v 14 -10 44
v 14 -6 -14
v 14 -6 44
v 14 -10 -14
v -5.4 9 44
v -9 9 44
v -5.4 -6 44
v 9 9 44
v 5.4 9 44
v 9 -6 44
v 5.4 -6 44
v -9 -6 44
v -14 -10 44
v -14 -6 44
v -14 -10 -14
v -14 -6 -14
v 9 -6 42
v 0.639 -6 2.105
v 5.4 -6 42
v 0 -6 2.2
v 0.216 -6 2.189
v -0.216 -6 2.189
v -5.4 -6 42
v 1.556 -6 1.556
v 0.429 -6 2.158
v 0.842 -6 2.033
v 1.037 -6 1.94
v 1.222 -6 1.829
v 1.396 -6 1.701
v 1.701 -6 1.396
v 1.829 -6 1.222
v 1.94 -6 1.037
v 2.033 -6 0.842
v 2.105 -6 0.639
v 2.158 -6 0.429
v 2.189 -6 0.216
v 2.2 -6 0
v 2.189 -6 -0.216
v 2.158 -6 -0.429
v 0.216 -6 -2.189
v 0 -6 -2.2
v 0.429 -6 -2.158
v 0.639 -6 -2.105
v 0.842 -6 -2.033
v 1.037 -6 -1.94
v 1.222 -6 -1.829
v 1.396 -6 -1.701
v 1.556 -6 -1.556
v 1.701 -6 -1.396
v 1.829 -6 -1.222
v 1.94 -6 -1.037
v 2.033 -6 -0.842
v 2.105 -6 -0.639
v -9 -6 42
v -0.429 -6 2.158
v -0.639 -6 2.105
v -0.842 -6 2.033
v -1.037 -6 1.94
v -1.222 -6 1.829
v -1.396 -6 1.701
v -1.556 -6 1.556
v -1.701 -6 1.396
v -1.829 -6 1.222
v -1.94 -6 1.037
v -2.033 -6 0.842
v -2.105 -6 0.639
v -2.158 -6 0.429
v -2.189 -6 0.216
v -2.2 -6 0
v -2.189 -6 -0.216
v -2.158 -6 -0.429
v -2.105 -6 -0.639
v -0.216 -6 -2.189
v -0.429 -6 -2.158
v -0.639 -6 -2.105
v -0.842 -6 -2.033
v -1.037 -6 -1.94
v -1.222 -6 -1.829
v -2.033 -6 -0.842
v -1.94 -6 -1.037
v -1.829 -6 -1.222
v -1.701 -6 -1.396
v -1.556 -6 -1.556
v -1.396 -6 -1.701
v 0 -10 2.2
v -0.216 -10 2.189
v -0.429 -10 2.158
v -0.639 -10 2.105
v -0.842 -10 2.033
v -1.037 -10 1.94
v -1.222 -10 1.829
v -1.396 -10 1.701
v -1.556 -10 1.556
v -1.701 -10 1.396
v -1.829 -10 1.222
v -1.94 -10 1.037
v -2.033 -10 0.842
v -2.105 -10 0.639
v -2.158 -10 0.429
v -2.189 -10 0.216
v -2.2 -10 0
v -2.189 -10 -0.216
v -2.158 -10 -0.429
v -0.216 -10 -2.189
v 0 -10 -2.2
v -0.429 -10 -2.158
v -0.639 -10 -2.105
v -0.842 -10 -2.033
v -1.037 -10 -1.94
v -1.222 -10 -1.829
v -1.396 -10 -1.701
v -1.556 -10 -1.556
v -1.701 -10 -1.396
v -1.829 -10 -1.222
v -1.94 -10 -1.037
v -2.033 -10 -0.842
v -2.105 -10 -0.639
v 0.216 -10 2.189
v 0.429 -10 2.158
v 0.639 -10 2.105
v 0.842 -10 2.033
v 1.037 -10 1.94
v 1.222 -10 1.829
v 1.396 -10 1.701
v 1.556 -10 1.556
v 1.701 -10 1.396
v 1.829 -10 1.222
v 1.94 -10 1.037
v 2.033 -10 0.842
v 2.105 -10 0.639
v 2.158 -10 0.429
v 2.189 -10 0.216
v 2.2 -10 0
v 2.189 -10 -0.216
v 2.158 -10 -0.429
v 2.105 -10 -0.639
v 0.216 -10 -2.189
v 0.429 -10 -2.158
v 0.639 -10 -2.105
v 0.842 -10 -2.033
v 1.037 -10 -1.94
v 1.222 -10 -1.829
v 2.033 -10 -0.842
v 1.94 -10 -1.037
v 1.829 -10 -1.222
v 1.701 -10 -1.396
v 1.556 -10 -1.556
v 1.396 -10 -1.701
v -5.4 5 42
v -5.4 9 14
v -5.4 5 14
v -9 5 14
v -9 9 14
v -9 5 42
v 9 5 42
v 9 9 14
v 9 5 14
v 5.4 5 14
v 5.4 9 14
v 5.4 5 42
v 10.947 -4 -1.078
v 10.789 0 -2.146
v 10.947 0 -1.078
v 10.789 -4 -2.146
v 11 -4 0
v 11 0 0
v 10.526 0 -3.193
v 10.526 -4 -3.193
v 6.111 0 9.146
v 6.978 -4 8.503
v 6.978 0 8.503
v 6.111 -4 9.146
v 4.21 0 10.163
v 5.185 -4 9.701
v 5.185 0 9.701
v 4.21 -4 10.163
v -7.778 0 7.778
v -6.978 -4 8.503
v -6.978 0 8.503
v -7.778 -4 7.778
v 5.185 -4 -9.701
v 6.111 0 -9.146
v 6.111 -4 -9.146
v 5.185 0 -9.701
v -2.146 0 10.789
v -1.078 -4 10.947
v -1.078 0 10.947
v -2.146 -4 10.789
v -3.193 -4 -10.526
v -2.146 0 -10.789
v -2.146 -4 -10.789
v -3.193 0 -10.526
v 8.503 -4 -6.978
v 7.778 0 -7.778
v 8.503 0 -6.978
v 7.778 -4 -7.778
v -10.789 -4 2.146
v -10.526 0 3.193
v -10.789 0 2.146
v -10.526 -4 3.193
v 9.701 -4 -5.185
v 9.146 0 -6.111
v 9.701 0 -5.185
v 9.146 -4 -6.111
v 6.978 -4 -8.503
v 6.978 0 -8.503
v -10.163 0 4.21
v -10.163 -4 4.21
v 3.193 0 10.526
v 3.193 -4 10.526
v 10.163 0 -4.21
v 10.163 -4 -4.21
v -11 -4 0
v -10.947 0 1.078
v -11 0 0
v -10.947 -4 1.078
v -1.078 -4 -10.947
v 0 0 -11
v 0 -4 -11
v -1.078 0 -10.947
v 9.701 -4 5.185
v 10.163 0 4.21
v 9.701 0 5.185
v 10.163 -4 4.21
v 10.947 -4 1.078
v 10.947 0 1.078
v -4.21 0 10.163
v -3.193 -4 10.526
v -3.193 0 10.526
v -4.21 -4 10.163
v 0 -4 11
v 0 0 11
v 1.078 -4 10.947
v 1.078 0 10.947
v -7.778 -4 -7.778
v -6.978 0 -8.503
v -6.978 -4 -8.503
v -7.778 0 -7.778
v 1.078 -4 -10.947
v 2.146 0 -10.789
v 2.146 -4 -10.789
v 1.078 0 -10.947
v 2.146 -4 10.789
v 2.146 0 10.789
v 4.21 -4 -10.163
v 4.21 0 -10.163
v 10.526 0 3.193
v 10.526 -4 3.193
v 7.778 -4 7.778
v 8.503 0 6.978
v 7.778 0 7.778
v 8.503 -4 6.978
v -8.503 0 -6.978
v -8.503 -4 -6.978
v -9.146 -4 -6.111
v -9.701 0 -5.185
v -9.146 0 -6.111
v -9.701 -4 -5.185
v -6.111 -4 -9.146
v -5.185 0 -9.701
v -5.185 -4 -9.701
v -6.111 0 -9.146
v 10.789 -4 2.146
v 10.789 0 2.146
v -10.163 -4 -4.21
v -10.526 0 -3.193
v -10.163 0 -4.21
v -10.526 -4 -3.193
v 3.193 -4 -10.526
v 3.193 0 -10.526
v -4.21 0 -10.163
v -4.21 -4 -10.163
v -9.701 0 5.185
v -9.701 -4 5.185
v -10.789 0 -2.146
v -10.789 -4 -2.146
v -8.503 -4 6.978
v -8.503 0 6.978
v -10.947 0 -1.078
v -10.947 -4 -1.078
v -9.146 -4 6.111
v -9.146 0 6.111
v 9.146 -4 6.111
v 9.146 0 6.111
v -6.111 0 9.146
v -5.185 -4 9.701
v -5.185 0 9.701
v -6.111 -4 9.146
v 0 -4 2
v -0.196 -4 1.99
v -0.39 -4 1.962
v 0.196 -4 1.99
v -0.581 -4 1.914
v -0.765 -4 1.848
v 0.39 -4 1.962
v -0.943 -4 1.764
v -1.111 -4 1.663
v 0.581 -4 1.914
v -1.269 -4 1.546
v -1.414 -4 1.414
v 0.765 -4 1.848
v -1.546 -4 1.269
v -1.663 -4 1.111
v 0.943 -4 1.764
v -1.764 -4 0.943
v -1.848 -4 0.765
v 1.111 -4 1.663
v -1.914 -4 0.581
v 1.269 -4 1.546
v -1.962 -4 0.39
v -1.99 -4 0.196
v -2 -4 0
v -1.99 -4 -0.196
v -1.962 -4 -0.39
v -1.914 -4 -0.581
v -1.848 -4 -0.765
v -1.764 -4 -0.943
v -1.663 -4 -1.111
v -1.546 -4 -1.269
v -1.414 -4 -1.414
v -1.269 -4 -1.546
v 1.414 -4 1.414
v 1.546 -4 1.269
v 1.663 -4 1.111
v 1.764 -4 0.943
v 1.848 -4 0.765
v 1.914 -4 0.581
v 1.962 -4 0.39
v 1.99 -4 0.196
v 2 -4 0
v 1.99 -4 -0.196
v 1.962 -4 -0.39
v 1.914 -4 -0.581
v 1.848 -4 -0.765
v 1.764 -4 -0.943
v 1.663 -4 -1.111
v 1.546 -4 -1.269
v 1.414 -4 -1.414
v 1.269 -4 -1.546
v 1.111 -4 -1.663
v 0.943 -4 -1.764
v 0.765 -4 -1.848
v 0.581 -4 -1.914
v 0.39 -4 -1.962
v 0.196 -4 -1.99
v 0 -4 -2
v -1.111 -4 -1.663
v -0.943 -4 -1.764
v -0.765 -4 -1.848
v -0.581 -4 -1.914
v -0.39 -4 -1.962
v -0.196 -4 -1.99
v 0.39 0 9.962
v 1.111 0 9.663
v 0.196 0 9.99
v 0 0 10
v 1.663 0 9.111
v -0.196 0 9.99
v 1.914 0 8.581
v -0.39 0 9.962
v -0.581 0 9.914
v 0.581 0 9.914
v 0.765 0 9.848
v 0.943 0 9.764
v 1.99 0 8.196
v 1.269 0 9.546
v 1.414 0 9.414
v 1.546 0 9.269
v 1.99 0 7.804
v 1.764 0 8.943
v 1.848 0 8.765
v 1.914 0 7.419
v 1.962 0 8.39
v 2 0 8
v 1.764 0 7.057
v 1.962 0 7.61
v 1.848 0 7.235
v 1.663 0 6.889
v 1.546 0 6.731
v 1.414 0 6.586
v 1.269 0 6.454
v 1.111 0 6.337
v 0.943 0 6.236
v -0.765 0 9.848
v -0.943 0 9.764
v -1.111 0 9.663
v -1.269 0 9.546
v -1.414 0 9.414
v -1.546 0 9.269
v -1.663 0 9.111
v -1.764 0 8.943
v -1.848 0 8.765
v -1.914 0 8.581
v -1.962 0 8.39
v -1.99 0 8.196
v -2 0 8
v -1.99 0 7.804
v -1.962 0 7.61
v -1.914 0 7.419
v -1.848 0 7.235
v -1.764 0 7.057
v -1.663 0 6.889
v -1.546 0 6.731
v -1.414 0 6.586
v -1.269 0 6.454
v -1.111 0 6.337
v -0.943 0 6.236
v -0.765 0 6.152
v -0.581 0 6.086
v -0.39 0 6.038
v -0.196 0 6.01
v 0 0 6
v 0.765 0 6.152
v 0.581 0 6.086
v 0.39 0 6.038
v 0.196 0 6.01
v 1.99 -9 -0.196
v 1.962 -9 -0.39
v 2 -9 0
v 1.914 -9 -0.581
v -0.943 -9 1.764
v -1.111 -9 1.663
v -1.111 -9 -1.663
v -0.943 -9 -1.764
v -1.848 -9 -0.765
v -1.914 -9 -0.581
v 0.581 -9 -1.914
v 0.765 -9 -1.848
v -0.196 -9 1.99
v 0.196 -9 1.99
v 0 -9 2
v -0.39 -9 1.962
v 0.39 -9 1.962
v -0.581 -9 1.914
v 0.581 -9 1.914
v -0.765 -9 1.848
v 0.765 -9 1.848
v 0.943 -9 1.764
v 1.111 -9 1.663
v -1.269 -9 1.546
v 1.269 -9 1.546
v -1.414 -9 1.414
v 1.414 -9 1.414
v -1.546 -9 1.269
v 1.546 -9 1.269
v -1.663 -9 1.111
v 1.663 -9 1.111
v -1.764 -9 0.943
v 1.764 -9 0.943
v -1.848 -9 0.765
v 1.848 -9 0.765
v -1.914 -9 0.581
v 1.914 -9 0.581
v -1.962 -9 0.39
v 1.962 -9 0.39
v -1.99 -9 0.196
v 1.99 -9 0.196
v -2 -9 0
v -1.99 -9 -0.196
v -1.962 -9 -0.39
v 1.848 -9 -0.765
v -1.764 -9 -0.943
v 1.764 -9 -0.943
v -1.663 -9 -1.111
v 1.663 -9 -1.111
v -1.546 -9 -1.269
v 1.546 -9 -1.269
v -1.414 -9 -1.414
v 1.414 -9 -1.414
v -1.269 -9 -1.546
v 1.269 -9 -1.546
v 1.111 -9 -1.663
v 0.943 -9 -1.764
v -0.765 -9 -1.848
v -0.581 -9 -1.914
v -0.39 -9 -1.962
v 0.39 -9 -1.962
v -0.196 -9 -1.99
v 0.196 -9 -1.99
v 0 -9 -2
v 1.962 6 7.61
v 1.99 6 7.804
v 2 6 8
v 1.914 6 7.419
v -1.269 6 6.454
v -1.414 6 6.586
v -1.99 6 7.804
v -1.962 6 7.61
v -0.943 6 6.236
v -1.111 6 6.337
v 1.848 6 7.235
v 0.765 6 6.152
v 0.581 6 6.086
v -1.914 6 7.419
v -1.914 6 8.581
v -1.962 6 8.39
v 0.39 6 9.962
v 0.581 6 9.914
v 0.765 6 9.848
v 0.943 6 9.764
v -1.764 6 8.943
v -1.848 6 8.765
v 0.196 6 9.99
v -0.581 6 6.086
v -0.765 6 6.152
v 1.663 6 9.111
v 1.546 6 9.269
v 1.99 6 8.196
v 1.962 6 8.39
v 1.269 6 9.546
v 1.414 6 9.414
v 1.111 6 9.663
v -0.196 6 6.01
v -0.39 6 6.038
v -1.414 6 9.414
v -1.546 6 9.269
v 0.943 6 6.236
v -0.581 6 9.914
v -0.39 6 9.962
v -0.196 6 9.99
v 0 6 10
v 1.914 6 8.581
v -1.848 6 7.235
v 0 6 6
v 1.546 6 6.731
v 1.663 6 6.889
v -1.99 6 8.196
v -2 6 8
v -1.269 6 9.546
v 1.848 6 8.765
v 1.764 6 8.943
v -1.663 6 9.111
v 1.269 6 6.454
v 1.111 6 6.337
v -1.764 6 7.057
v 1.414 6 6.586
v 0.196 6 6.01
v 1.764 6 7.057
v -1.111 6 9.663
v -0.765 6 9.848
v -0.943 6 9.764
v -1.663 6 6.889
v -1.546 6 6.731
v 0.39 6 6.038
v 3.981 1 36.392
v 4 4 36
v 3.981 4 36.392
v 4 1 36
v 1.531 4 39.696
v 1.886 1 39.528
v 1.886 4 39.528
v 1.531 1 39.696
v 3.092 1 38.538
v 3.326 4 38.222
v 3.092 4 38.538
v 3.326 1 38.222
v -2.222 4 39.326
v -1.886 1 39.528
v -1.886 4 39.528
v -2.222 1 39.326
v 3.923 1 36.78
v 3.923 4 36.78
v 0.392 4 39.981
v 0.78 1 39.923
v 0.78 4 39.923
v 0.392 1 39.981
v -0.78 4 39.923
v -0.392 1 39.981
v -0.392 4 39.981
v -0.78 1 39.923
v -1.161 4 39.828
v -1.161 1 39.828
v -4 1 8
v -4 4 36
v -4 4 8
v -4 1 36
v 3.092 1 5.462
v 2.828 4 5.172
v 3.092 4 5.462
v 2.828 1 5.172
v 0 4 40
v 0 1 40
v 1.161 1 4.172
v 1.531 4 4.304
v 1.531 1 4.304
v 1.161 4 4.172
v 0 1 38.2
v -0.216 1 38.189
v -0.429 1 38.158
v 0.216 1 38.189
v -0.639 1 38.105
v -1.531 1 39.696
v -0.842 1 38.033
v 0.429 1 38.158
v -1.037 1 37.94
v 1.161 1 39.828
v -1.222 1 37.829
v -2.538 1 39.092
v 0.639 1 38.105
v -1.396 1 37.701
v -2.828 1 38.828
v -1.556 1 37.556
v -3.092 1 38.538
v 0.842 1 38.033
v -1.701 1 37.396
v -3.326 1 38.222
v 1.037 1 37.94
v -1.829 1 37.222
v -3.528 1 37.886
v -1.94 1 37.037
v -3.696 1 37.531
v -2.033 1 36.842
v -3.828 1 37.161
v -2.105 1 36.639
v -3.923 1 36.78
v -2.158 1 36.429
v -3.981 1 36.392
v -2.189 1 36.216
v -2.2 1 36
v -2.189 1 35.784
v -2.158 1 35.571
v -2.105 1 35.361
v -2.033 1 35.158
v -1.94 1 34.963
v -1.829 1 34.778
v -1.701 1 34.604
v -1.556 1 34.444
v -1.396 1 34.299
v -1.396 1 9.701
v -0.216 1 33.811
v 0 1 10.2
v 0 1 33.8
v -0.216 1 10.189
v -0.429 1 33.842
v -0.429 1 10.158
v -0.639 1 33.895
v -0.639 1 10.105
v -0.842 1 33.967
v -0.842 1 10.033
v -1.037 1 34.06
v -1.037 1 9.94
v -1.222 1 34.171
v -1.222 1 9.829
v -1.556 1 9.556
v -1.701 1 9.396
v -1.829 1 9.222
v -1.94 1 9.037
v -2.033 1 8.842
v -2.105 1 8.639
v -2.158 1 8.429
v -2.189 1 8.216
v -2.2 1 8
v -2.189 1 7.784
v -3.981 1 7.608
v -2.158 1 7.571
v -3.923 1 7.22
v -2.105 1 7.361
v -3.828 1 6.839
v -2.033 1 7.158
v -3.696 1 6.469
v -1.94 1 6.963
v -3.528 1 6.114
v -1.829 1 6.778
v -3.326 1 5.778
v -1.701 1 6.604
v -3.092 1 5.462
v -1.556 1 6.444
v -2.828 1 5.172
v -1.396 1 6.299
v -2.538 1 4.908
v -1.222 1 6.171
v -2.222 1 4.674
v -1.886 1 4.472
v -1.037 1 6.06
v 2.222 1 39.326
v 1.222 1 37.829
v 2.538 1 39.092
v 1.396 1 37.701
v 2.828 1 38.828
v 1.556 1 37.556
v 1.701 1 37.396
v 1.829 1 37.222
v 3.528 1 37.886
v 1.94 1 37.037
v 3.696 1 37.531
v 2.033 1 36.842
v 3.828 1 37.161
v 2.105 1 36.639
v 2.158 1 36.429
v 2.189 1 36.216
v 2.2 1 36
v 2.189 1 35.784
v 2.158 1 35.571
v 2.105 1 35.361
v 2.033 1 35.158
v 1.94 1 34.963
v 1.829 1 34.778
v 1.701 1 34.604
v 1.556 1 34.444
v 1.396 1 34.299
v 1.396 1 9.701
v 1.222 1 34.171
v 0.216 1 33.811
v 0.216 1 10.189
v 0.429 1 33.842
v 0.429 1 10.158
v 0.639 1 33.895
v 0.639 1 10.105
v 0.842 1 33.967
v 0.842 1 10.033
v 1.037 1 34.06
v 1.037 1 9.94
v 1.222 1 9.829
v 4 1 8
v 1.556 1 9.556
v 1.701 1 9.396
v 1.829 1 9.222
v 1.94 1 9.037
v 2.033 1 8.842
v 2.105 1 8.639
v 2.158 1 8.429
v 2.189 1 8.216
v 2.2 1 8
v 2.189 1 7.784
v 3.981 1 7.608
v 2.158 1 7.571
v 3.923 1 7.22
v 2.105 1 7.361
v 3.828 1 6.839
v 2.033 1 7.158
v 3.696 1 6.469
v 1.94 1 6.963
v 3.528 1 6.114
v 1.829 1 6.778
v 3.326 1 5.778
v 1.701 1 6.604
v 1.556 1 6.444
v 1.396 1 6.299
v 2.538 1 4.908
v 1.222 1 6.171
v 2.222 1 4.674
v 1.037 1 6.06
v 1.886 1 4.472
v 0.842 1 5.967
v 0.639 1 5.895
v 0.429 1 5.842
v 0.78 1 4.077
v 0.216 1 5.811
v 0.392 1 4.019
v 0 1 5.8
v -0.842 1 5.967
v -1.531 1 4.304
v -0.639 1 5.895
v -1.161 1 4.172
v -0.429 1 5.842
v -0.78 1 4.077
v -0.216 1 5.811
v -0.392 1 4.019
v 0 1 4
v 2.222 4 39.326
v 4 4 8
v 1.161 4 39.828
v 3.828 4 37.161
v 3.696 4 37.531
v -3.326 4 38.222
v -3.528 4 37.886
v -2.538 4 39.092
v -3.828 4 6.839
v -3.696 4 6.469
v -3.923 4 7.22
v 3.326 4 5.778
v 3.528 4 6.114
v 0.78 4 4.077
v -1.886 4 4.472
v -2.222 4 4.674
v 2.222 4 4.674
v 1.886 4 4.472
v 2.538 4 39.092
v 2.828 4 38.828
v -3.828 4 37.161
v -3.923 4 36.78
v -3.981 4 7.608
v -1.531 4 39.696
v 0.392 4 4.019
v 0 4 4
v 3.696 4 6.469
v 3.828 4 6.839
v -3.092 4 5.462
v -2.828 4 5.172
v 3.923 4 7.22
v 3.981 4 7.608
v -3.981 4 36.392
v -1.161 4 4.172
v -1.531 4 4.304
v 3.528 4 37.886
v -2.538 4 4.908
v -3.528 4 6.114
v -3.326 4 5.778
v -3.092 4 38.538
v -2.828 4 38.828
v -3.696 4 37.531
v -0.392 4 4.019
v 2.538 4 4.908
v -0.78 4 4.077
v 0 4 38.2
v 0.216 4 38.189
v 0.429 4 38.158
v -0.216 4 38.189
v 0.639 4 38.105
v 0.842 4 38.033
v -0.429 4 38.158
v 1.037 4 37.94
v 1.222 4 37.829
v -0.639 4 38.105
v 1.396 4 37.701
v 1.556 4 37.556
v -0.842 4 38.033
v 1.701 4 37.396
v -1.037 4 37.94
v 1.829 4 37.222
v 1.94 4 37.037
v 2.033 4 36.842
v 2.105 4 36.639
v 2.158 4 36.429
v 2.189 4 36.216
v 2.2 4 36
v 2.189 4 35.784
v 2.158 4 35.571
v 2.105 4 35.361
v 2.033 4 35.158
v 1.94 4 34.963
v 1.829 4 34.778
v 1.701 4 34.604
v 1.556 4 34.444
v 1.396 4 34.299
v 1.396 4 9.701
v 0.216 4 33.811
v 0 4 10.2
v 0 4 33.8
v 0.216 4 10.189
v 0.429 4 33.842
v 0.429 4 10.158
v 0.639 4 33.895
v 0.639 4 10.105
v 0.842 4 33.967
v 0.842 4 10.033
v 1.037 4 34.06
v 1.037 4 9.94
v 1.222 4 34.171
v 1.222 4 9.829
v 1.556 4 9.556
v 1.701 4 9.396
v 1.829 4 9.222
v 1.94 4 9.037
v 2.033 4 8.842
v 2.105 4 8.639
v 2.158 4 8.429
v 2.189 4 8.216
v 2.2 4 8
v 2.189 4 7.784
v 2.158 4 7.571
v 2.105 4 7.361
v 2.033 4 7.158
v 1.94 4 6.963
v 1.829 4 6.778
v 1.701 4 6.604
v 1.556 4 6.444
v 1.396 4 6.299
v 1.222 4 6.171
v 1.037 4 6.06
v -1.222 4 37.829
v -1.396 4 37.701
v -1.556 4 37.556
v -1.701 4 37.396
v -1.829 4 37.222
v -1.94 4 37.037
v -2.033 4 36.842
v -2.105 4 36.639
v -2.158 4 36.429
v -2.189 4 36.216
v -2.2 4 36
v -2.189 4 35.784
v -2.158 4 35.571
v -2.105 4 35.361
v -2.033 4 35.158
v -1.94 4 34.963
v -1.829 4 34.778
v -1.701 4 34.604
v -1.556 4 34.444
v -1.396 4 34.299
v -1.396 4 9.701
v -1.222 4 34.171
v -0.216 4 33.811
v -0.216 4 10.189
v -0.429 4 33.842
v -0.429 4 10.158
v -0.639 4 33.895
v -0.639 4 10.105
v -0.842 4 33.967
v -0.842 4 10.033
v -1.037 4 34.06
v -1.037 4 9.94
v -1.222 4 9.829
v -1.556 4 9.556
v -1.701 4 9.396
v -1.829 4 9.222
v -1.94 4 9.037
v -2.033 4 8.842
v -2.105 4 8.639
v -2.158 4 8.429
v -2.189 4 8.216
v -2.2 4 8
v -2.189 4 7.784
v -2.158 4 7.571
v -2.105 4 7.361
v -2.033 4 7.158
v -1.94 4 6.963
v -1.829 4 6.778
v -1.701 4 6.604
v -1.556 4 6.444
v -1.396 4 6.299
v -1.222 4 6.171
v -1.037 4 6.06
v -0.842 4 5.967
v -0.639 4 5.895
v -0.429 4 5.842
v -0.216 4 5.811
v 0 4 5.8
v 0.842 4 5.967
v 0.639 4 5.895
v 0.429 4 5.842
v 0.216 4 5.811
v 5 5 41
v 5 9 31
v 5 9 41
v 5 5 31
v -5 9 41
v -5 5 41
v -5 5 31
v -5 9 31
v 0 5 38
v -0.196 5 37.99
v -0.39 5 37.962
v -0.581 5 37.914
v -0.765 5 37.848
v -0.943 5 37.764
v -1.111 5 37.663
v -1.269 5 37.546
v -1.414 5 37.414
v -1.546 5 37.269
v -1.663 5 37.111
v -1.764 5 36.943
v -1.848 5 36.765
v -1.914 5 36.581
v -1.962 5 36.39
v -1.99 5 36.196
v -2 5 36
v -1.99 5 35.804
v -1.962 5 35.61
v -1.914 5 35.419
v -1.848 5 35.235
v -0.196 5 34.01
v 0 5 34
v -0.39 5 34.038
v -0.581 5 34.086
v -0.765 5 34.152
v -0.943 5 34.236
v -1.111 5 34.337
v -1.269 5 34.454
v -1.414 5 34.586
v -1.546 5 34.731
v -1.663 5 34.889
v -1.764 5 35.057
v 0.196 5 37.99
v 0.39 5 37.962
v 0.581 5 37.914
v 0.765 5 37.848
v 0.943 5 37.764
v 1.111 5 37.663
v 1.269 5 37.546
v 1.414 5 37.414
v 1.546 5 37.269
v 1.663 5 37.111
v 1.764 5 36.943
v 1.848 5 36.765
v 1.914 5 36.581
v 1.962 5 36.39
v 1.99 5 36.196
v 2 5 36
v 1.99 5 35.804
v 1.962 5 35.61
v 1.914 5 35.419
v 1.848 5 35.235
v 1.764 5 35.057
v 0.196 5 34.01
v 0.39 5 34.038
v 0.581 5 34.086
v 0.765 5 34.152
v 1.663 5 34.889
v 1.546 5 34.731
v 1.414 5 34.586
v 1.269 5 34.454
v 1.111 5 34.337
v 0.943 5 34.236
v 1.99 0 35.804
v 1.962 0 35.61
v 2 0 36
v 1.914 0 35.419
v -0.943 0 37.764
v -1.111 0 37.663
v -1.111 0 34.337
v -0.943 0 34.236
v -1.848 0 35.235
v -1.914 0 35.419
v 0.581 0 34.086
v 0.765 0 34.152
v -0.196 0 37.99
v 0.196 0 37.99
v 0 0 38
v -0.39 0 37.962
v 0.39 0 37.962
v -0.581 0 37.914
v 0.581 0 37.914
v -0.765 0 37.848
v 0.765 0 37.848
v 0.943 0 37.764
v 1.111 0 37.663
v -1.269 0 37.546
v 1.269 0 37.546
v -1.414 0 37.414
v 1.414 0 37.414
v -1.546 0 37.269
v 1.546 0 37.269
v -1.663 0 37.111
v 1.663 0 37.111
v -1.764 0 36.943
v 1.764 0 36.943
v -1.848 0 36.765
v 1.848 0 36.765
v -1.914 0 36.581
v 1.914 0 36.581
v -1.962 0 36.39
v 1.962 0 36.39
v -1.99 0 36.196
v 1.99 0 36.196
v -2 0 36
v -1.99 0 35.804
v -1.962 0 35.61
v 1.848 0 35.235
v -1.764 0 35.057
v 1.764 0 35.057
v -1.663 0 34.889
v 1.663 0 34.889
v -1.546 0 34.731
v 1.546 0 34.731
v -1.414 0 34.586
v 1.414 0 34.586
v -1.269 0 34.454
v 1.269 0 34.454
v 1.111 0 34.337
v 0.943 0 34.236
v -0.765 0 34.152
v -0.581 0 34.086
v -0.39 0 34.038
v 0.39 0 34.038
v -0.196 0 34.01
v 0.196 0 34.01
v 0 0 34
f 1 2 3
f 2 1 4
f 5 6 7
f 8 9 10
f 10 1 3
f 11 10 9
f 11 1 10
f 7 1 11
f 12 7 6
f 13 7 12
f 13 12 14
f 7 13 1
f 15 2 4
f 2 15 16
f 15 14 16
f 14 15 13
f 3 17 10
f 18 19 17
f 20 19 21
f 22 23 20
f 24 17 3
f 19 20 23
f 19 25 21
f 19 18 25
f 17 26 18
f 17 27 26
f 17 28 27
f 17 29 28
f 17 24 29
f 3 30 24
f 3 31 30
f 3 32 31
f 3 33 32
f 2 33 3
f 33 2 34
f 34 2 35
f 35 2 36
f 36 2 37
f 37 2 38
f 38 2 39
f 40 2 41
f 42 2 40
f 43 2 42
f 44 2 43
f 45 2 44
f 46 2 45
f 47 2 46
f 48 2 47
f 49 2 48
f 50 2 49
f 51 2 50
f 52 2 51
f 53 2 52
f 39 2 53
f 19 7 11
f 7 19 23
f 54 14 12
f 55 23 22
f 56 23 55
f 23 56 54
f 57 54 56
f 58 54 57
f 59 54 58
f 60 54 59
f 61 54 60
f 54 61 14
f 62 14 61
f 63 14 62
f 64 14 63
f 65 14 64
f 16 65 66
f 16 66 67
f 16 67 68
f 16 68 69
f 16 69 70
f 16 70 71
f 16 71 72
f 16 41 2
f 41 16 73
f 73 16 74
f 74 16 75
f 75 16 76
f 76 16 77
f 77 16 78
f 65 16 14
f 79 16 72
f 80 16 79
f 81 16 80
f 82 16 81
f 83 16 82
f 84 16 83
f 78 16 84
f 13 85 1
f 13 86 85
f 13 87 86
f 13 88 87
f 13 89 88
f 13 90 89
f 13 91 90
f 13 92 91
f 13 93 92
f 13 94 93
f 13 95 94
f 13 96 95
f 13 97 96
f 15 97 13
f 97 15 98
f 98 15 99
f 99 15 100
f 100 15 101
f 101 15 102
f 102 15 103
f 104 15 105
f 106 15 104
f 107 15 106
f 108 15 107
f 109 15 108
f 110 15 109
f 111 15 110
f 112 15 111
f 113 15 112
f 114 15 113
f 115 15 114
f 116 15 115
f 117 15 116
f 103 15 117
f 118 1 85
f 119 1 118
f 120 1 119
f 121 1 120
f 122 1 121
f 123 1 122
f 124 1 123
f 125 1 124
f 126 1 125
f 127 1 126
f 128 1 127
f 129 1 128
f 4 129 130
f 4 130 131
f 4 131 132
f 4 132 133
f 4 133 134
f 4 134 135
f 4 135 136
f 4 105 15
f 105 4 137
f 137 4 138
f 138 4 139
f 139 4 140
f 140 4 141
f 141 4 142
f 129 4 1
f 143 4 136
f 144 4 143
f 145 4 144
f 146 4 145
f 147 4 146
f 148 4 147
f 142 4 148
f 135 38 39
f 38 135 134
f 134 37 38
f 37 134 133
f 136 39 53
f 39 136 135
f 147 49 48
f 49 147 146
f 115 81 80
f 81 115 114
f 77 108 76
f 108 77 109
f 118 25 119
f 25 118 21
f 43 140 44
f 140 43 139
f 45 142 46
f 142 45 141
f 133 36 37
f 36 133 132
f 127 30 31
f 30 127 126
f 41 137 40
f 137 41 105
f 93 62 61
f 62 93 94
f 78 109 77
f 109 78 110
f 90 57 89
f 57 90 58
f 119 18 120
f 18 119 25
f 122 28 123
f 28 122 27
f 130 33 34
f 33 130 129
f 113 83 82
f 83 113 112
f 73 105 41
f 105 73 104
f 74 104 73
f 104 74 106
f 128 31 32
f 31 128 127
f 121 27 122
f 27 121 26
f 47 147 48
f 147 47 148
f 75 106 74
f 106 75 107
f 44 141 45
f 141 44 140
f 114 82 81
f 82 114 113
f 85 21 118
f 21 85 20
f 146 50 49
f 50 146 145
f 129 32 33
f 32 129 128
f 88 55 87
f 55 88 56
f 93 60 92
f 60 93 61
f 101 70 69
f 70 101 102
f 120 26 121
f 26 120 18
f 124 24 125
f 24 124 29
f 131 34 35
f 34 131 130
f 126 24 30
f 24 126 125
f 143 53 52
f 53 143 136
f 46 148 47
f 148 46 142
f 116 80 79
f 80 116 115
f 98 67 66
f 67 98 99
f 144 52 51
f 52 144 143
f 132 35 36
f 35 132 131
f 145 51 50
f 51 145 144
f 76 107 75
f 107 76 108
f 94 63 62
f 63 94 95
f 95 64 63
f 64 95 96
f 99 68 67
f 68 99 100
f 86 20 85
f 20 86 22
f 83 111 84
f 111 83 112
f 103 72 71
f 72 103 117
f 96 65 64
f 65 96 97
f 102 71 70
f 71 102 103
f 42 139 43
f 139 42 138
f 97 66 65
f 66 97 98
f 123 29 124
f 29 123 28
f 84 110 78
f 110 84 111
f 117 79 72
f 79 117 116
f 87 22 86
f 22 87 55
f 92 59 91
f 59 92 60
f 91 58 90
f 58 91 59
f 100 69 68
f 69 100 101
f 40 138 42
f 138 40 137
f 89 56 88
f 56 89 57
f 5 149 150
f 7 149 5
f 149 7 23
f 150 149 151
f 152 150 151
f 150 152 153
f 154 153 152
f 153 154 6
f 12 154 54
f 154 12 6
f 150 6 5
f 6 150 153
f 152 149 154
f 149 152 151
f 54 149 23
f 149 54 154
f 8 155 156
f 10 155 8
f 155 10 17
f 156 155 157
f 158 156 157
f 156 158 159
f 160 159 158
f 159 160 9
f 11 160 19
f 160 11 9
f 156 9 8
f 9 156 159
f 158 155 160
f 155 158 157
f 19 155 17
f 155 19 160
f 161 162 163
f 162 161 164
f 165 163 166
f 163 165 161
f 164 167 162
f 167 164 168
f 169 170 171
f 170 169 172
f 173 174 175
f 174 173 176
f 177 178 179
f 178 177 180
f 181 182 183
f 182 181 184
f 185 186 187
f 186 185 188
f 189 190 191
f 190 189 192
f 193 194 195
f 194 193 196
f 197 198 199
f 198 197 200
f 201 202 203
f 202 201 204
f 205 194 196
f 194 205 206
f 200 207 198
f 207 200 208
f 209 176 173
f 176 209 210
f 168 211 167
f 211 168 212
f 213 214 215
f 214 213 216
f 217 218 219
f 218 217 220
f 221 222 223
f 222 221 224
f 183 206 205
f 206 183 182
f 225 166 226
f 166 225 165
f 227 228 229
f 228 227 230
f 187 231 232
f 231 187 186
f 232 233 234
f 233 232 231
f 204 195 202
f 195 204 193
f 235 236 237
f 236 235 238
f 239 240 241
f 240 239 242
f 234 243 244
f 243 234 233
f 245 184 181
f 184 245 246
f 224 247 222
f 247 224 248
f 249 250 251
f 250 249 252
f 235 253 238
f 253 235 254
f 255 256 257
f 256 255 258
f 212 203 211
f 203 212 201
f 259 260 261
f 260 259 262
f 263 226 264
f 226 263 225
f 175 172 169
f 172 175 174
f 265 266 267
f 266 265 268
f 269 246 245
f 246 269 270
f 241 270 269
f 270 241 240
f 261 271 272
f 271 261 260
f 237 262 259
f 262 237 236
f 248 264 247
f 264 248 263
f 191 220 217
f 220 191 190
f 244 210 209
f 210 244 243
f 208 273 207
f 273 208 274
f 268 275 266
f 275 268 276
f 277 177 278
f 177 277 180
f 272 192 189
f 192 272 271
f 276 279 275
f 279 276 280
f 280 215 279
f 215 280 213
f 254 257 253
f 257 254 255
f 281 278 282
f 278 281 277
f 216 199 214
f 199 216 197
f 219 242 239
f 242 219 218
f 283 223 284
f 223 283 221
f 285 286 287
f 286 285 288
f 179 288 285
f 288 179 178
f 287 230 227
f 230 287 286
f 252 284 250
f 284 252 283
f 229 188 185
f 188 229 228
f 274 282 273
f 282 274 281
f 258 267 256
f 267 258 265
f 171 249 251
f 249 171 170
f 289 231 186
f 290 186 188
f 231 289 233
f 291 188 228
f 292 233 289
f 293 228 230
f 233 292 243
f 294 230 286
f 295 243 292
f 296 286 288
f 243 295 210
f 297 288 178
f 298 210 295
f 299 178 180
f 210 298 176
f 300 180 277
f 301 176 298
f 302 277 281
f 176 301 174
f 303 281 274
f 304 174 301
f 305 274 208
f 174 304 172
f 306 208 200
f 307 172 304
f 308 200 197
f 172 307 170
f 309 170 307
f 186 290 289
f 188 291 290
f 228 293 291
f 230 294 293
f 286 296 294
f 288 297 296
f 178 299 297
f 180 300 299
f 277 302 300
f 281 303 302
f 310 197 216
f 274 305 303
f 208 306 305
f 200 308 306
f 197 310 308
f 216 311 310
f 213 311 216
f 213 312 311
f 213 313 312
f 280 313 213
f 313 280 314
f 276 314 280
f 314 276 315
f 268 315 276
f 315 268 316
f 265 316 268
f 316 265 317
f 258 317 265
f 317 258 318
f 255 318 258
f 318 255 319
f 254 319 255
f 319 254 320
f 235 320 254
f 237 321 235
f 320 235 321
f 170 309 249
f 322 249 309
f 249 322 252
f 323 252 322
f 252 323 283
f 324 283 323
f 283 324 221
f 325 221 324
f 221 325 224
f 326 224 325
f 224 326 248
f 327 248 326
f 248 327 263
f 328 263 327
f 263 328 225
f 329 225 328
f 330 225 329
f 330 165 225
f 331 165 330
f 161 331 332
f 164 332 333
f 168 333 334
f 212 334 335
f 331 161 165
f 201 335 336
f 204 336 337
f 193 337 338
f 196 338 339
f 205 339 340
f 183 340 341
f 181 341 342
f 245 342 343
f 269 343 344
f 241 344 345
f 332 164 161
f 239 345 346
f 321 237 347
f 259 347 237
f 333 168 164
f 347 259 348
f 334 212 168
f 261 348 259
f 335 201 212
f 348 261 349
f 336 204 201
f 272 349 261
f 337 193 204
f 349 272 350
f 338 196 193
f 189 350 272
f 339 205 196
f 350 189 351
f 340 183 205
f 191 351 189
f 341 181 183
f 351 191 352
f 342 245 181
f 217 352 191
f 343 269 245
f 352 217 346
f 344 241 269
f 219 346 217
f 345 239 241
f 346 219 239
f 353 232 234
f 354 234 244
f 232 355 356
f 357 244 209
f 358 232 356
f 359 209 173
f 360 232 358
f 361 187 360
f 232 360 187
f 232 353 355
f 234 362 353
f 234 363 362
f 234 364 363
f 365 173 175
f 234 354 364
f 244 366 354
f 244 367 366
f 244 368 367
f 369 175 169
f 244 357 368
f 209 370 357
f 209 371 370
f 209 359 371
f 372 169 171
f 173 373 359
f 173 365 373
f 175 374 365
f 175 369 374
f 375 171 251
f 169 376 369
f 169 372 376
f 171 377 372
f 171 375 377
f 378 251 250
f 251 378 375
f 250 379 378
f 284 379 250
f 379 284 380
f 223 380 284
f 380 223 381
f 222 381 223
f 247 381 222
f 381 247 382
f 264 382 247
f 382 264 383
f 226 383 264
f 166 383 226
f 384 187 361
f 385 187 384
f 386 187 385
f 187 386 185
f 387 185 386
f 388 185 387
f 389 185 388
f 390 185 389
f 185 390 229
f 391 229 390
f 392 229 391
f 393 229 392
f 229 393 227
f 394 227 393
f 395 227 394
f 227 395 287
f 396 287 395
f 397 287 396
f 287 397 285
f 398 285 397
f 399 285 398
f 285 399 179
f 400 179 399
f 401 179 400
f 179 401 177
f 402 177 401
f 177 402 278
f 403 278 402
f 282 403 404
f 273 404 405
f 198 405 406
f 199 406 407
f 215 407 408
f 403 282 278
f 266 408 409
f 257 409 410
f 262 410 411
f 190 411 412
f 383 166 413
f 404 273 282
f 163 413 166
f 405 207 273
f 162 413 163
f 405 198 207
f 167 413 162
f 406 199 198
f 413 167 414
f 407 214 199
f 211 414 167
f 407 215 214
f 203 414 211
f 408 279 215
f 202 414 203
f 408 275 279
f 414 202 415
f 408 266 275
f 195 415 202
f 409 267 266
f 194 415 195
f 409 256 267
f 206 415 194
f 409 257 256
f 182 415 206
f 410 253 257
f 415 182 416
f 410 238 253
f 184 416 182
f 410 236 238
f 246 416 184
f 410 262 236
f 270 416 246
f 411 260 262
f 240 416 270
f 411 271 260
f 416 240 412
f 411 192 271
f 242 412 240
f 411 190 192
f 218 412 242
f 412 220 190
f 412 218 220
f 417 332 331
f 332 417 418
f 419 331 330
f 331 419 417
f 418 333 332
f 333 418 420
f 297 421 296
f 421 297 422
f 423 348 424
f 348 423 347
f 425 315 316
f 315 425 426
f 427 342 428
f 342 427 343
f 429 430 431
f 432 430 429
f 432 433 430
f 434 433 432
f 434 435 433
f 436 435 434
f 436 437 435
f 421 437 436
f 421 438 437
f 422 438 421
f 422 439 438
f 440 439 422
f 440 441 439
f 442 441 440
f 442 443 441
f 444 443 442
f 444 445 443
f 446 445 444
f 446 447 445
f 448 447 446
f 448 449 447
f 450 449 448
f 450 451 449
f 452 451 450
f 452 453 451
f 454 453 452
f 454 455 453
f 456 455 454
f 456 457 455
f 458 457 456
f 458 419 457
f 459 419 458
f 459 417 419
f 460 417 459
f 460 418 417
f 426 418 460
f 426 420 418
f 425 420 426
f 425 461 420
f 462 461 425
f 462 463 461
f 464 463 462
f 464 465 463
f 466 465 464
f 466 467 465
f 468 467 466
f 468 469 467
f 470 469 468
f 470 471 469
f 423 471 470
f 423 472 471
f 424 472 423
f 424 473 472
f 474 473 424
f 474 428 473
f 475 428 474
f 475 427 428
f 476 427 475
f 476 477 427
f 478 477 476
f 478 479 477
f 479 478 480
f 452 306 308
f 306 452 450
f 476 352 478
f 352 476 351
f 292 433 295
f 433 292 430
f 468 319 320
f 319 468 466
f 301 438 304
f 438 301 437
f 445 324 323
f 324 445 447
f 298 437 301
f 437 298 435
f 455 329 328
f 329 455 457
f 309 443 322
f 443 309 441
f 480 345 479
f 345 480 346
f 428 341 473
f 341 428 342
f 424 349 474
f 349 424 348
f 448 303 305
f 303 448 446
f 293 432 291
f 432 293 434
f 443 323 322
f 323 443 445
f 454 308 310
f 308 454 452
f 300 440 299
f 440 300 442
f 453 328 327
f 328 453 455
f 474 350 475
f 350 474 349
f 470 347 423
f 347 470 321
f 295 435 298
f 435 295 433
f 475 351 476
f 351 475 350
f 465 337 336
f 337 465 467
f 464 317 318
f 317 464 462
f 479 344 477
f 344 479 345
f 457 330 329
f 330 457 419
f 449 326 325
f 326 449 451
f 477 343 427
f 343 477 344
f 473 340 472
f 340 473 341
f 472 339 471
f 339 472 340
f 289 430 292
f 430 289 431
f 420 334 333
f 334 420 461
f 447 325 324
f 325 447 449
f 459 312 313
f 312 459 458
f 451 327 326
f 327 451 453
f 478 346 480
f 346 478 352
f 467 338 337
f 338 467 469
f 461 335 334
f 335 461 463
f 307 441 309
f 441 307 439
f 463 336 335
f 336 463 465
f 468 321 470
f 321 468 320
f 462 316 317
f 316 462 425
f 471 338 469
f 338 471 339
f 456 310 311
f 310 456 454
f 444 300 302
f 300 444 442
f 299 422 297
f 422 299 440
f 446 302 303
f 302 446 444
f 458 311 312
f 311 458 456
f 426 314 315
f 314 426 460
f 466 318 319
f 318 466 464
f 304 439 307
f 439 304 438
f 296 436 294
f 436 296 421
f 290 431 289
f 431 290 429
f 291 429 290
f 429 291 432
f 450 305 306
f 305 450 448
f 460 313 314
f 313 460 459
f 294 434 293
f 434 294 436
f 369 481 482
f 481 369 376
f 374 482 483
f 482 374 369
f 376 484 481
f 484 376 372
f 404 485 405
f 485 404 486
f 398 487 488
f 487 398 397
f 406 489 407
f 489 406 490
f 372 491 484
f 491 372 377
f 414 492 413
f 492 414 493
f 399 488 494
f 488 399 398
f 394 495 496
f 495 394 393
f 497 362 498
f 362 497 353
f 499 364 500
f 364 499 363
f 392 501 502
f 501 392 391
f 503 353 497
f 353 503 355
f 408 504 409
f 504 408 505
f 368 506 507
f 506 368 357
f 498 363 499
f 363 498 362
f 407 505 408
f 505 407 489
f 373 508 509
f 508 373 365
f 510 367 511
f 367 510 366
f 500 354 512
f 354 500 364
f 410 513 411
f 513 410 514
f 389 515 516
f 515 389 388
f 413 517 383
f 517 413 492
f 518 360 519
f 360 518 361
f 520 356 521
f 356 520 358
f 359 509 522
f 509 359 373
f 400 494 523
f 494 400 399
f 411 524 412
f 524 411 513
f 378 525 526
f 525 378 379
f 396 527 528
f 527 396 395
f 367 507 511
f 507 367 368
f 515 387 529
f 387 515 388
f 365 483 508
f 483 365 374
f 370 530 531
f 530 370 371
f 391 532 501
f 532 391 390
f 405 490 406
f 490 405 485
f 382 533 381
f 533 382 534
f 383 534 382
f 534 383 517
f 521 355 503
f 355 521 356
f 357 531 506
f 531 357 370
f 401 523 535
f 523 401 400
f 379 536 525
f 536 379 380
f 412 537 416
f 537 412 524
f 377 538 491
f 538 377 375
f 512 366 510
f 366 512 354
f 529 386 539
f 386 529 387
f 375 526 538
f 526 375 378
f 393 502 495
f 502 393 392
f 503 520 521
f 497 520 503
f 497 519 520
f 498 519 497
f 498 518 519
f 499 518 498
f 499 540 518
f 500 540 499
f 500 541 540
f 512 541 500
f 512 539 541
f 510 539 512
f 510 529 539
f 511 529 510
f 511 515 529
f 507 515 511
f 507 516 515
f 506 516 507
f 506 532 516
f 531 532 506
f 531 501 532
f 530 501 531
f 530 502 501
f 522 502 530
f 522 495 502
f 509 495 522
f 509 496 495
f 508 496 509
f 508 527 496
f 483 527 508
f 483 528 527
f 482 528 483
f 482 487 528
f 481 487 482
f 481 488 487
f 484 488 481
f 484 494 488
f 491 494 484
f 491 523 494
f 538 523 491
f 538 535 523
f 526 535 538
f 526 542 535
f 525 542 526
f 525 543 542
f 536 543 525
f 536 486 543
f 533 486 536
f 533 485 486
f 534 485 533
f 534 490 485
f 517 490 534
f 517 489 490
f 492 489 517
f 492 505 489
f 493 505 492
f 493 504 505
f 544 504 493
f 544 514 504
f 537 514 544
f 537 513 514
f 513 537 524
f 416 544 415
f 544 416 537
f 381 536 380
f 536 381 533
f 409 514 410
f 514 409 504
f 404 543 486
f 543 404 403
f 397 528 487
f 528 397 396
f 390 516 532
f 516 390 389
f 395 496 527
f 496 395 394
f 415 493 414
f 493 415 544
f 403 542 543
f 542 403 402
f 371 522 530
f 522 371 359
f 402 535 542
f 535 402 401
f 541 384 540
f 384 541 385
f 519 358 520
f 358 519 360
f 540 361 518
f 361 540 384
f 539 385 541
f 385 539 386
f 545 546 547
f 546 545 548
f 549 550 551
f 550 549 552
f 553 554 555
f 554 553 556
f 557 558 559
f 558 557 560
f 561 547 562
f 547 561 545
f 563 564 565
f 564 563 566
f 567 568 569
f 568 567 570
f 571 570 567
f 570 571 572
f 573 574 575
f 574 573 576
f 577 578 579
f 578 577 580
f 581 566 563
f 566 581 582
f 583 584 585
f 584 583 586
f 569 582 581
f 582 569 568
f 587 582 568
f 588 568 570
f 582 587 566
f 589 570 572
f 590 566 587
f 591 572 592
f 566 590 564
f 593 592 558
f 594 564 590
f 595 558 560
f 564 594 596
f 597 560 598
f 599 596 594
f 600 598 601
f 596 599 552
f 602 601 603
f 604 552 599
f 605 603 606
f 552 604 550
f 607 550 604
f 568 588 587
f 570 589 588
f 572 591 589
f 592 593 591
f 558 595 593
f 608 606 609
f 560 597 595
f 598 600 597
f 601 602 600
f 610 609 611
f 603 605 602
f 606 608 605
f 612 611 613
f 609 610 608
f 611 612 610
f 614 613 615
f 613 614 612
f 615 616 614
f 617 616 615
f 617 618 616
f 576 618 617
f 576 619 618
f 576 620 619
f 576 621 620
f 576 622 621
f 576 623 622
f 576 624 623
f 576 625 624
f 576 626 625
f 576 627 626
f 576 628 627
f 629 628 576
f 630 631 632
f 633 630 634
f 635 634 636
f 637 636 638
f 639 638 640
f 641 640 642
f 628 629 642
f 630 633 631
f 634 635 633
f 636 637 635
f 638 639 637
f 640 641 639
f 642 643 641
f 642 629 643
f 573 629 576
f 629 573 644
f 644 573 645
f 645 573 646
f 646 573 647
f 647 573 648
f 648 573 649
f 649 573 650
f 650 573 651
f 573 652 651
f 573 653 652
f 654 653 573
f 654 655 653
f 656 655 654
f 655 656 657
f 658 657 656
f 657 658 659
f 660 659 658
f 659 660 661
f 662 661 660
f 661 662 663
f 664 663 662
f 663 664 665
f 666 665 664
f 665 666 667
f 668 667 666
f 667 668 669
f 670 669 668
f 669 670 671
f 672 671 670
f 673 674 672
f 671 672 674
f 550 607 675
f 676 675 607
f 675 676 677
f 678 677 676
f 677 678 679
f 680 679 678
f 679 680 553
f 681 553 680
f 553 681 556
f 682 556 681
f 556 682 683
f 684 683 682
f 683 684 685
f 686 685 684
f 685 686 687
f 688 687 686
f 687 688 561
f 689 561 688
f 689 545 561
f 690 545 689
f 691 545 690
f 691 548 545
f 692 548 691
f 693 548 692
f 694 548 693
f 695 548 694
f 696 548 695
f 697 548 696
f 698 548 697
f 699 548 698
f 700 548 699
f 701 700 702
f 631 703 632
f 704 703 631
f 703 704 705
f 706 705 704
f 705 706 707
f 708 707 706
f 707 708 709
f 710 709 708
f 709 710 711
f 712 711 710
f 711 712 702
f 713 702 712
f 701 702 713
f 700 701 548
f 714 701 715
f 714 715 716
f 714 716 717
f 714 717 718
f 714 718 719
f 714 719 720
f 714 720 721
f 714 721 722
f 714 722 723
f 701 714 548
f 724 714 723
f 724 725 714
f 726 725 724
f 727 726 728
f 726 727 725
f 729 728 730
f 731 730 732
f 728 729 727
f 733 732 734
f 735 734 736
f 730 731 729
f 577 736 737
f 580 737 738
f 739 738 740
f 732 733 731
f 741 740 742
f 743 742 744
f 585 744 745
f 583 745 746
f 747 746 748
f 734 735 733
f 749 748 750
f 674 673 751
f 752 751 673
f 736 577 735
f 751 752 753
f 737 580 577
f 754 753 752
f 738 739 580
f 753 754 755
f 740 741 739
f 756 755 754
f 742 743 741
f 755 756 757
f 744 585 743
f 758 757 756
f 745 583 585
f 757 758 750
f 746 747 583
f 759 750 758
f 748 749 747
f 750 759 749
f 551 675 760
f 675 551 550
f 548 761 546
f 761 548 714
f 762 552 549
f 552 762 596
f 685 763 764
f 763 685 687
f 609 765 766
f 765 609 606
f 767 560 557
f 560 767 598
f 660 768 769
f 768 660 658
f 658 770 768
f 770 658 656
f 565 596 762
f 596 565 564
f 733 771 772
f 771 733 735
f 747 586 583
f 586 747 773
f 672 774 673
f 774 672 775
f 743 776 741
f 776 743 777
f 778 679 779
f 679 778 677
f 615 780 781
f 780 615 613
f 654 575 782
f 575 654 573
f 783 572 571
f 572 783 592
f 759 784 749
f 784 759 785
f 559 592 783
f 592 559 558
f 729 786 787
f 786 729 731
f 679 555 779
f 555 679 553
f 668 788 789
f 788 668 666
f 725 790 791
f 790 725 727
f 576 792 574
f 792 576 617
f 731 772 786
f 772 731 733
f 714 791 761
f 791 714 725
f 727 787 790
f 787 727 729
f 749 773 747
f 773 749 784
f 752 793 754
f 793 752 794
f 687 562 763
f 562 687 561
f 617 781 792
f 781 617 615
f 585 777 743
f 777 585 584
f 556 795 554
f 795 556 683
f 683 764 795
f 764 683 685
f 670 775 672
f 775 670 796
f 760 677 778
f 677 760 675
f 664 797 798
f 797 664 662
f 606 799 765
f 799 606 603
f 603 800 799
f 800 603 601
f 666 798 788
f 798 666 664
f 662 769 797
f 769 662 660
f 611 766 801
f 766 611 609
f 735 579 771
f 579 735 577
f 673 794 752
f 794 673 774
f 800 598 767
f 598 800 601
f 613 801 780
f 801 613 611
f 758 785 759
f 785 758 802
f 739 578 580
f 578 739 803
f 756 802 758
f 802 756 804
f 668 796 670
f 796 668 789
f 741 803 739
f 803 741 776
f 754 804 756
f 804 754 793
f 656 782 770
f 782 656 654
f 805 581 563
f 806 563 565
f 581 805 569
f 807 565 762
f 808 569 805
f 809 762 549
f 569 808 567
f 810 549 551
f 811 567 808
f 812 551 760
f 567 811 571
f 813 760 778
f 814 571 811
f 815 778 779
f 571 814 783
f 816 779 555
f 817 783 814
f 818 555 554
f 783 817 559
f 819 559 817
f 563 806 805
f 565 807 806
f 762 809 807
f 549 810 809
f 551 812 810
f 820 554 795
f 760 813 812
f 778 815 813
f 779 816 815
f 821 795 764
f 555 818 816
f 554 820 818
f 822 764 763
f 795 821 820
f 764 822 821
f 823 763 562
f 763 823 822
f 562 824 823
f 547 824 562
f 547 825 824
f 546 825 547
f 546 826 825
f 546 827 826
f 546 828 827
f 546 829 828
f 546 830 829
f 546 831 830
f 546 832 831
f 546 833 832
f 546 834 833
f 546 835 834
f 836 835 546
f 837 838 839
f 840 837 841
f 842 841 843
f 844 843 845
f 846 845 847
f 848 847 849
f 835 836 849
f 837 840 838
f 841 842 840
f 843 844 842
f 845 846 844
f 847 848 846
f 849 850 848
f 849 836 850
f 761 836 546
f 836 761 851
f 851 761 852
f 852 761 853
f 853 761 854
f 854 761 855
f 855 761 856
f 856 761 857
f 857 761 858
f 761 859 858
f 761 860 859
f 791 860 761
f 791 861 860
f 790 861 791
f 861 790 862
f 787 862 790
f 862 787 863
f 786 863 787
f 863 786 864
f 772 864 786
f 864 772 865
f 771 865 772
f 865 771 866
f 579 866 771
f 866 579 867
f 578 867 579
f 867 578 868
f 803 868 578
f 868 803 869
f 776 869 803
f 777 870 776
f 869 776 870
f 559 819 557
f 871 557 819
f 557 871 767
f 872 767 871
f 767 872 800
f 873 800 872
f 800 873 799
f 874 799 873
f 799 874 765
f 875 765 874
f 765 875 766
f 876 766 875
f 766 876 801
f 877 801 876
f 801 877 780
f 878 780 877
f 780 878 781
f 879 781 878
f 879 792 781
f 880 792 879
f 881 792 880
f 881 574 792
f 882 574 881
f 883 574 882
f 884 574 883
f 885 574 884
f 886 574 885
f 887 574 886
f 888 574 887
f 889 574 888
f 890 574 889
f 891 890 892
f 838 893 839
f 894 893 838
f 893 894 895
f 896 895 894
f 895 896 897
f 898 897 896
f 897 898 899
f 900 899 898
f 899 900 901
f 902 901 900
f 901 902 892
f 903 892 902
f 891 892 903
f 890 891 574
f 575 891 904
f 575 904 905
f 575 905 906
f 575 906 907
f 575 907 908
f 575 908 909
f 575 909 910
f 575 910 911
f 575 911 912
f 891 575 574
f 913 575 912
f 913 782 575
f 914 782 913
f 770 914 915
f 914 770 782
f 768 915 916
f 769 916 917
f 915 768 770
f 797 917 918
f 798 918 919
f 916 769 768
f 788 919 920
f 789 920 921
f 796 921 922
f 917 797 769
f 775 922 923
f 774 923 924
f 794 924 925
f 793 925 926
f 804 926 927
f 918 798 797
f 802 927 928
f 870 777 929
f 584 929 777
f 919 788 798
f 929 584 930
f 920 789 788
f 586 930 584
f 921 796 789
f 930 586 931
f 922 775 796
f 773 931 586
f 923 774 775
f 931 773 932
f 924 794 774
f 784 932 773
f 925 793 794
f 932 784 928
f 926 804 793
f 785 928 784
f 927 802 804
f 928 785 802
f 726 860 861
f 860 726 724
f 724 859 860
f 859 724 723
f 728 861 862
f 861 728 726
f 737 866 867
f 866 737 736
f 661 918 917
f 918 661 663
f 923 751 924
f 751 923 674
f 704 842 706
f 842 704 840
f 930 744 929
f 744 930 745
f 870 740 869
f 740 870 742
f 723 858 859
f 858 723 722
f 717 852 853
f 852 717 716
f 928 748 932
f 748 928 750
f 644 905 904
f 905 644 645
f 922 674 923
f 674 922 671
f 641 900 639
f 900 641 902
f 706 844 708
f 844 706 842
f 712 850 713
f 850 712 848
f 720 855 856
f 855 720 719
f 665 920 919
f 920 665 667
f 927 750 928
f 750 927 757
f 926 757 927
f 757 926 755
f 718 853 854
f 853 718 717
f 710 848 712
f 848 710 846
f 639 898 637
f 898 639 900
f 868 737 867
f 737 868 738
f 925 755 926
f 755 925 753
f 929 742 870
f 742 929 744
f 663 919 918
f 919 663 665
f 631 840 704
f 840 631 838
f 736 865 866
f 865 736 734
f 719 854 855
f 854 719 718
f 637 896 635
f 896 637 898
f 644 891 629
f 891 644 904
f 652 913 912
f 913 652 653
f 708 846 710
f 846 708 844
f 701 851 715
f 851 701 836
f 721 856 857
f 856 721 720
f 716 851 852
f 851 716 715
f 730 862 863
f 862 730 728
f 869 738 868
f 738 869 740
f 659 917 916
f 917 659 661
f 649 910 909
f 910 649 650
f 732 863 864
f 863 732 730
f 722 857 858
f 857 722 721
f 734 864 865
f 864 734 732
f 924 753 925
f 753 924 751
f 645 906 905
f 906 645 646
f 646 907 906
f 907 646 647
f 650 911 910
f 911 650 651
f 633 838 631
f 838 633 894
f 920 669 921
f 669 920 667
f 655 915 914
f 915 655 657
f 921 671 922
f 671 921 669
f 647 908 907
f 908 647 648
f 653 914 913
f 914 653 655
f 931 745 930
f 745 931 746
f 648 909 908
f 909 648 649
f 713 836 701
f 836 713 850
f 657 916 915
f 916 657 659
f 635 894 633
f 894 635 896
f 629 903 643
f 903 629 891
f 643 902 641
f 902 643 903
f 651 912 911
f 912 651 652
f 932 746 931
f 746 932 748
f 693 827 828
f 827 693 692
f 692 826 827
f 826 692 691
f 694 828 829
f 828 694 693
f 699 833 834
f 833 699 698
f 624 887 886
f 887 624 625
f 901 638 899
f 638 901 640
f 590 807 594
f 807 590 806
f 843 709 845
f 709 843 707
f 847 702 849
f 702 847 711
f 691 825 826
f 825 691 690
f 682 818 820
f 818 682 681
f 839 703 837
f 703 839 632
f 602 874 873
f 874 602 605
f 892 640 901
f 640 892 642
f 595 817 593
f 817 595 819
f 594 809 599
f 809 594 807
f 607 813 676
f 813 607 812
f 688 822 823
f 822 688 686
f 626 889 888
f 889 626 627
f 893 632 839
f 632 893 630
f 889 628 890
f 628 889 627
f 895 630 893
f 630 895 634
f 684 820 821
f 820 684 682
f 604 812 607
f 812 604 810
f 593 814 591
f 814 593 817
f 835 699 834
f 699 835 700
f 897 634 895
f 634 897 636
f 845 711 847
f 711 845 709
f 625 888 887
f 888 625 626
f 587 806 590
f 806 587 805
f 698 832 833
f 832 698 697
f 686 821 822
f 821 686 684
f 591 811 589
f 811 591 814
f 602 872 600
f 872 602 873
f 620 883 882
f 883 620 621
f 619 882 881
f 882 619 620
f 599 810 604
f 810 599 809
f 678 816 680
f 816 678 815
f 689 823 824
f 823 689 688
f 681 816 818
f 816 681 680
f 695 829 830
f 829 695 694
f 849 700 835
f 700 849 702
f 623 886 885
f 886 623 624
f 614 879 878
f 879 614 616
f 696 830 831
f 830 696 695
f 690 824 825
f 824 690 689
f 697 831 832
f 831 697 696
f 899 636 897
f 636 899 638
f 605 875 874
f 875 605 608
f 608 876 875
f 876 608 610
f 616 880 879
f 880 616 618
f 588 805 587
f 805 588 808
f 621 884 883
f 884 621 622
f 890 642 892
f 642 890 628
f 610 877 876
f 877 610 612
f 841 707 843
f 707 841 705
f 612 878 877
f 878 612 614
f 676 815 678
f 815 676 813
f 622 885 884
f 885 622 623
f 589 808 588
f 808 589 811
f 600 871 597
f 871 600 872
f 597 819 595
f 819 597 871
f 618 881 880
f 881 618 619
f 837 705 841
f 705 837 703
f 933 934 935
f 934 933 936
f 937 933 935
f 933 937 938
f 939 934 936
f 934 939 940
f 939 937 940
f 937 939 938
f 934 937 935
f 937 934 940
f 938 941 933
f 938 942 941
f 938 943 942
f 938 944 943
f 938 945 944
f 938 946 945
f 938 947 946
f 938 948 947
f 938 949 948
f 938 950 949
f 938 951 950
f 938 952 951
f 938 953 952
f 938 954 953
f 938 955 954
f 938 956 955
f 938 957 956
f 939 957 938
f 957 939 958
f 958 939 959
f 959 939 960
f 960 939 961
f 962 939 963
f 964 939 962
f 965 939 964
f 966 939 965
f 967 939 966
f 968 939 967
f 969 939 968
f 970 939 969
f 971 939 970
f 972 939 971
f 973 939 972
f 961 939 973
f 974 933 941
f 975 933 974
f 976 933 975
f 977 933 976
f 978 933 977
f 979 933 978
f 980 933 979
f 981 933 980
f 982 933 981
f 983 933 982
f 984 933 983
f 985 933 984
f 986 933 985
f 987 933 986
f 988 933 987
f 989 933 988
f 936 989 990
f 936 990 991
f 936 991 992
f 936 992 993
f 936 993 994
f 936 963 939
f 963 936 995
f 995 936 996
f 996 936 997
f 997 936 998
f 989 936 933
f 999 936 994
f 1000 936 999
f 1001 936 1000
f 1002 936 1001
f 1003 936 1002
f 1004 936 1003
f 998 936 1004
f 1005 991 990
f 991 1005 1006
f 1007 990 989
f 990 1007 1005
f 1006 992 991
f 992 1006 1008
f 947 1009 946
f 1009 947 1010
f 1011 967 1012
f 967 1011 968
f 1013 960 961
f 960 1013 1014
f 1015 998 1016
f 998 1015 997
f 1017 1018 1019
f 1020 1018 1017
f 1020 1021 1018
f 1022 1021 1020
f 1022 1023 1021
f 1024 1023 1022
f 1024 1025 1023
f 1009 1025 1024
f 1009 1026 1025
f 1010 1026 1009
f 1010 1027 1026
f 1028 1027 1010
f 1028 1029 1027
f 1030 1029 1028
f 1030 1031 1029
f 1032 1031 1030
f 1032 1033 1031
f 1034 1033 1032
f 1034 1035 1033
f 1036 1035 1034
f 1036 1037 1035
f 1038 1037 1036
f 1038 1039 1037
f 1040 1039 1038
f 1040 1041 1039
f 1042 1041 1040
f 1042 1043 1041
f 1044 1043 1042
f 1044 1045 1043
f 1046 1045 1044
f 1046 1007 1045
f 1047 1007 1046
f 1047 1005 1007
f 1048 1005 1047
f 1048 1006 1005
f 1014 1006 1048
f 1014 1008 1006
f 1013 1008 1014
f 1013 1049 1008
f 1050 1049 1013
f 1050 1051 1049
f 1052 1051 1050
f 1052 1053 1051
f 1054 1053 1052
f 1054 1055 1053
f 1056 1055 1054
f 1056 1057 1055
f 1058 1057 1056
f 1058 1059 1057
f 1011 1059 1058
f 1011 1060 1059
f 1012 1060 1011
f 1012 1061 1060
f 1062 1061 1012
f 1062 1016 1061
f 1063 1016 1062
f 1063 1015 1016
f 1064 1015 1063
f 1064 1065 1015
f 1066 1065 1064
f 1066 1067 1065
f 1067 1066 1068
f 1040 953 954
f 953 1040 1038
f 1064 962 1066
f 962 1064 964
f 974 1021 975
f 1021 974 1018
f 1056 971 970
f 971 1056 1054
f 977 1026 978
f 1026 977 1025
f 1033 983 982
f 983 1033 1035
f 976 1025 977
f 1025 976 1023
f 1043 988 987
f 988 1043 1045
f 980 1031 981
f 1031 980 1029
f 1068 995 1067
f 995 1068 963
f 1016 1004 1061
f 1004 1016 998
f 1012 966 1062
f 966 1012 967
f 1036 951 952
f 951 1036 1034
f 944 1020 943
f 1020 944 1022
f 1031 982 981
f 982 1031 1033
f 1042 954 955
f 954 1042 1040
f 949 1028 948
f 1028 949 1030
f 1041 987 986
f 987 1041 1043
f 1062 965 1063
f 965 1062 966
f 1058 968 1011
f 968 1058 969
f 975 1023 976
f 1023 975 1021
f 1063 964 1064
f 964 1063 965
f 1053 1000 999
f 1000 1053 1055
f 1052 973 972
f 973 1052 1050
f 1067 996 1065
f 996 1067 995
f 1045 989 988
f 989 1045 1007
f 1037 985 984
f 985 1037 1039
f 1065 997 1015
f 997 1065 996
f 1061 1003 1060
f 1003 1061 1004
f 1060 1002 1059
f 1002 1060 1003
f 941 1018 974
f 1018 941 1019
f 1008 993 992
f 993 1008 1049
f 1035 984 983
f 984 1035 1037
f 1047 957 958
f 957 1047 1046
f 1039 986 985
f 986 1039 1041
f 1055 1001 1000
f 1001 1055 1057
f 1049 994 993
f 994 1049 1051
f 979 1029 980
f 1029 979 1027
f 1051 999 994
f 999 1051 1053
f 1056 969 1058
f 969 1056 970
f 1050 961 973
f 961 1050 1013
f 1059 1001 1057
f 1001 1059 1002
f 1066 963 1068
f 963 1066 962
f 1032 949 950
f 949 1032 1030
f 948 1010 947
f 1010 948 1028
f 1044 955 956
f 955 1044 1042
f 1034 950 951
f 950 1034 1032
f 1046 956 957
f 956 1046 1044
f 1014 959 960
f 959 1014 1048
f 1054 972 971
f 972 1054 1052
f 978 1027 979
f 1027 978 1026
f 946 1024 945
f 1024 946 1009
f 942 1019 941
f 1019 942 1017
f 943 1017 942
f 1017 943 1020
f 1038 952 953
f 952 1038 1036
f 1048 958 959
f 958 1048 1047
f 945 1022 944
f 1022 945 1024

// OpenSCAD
// Original low-speed slider-crank verification fixture, millimetres.
// Four manufacturing parts. Pins are integral; external axial retention is
// required. No load capacity, print tolerance or physical function is claimed.
agentscad_part = "all";
agentscad_pose = false;
motion_angle = 0;
crank_radius = 8;
rod_length = 28;
$fn = 64;

// All pin axes are parallel to +Y; the mechanism moves in the XZ plane.
module y_cylinder(radius, height) { rotate([-90, 0, 0]) cylinder(r=radius, h=height); }
module crank_local() {
  union() {
    translate([0, -4, 0]) y_cylinder(crank_radius + 3, 4);
    translate([0, -9, 0]) y_cylinder(2, 5.1);
    translate([0, -0.1, crank_radius]) y_cylinder(2, 6.1);
  }
}
module rod_local() {
  difference() {
    hull() {
      translate([0, 1, 0]) y_cylinder(4, 3);
      translate([0, 1, rod_length]) y_cylinder(4, 3);
    }
    translate([0, 0.9, 0]) y_cylinder(2.2, 3.2);
    translate([0, 0.9, rod_length]) y_cylinder(2.2, 3.2);
  }
}
module slider_local() {
  union() {
    translate([-5, 5, -5]) cube([10, 4, 10]);
    y_cylinder(2, 5.1);
  }
}
module frame_local() {
  union() {
    difference() {
      translate([-14, -10, -14]) cube([28, 4, 58]);
      translate([0, -10.1, 0]) y_cylinder(2.2, 4.2);
    }
    for (x = [-9, 5.4]) {
      translate([x, 5, 14]) cube([3.6, 4, 30]);
      translate([x, -6.1, 42]) cube([3.6, 11.2, 2]);
    }
  }
}

// Source-side construction. The checker measures the resulting mesh contours;
// it never consumes these functions or their computed coordinates as evidence.
cx = crank_radius * sin(motion_angle);
cz = crank_radius * cos(motion_angle);
travel = sqrt(rod_length * rod_length - cx * cx);
pz = cz + travel;
rod_angle = atan2(-cx, travel);
module selected_part(id, placed) {
  if (id == "frame") frame_local();
  if (id == "crank") rotate([0, placed ? motion_angle : 0, 0]) crank_local();
  if (id == "rod") translate(placed ? [cx, 0, cz] : [0, 0, 0])
    rotate([0, placed ? rod_angle : 0, 0]) rod_local();
  if (id == "slider") translate([0, 0, placed ? pz : 0]) slider_local();
}
module generated_part() {
  if (agentscad_part == "all") {
    for (id = ["frame", "crank", "rod", "slider"]) selected_part(id, true);
  } else selected_part(agentscad_part, agentscad_pose);
}
generated_part();
